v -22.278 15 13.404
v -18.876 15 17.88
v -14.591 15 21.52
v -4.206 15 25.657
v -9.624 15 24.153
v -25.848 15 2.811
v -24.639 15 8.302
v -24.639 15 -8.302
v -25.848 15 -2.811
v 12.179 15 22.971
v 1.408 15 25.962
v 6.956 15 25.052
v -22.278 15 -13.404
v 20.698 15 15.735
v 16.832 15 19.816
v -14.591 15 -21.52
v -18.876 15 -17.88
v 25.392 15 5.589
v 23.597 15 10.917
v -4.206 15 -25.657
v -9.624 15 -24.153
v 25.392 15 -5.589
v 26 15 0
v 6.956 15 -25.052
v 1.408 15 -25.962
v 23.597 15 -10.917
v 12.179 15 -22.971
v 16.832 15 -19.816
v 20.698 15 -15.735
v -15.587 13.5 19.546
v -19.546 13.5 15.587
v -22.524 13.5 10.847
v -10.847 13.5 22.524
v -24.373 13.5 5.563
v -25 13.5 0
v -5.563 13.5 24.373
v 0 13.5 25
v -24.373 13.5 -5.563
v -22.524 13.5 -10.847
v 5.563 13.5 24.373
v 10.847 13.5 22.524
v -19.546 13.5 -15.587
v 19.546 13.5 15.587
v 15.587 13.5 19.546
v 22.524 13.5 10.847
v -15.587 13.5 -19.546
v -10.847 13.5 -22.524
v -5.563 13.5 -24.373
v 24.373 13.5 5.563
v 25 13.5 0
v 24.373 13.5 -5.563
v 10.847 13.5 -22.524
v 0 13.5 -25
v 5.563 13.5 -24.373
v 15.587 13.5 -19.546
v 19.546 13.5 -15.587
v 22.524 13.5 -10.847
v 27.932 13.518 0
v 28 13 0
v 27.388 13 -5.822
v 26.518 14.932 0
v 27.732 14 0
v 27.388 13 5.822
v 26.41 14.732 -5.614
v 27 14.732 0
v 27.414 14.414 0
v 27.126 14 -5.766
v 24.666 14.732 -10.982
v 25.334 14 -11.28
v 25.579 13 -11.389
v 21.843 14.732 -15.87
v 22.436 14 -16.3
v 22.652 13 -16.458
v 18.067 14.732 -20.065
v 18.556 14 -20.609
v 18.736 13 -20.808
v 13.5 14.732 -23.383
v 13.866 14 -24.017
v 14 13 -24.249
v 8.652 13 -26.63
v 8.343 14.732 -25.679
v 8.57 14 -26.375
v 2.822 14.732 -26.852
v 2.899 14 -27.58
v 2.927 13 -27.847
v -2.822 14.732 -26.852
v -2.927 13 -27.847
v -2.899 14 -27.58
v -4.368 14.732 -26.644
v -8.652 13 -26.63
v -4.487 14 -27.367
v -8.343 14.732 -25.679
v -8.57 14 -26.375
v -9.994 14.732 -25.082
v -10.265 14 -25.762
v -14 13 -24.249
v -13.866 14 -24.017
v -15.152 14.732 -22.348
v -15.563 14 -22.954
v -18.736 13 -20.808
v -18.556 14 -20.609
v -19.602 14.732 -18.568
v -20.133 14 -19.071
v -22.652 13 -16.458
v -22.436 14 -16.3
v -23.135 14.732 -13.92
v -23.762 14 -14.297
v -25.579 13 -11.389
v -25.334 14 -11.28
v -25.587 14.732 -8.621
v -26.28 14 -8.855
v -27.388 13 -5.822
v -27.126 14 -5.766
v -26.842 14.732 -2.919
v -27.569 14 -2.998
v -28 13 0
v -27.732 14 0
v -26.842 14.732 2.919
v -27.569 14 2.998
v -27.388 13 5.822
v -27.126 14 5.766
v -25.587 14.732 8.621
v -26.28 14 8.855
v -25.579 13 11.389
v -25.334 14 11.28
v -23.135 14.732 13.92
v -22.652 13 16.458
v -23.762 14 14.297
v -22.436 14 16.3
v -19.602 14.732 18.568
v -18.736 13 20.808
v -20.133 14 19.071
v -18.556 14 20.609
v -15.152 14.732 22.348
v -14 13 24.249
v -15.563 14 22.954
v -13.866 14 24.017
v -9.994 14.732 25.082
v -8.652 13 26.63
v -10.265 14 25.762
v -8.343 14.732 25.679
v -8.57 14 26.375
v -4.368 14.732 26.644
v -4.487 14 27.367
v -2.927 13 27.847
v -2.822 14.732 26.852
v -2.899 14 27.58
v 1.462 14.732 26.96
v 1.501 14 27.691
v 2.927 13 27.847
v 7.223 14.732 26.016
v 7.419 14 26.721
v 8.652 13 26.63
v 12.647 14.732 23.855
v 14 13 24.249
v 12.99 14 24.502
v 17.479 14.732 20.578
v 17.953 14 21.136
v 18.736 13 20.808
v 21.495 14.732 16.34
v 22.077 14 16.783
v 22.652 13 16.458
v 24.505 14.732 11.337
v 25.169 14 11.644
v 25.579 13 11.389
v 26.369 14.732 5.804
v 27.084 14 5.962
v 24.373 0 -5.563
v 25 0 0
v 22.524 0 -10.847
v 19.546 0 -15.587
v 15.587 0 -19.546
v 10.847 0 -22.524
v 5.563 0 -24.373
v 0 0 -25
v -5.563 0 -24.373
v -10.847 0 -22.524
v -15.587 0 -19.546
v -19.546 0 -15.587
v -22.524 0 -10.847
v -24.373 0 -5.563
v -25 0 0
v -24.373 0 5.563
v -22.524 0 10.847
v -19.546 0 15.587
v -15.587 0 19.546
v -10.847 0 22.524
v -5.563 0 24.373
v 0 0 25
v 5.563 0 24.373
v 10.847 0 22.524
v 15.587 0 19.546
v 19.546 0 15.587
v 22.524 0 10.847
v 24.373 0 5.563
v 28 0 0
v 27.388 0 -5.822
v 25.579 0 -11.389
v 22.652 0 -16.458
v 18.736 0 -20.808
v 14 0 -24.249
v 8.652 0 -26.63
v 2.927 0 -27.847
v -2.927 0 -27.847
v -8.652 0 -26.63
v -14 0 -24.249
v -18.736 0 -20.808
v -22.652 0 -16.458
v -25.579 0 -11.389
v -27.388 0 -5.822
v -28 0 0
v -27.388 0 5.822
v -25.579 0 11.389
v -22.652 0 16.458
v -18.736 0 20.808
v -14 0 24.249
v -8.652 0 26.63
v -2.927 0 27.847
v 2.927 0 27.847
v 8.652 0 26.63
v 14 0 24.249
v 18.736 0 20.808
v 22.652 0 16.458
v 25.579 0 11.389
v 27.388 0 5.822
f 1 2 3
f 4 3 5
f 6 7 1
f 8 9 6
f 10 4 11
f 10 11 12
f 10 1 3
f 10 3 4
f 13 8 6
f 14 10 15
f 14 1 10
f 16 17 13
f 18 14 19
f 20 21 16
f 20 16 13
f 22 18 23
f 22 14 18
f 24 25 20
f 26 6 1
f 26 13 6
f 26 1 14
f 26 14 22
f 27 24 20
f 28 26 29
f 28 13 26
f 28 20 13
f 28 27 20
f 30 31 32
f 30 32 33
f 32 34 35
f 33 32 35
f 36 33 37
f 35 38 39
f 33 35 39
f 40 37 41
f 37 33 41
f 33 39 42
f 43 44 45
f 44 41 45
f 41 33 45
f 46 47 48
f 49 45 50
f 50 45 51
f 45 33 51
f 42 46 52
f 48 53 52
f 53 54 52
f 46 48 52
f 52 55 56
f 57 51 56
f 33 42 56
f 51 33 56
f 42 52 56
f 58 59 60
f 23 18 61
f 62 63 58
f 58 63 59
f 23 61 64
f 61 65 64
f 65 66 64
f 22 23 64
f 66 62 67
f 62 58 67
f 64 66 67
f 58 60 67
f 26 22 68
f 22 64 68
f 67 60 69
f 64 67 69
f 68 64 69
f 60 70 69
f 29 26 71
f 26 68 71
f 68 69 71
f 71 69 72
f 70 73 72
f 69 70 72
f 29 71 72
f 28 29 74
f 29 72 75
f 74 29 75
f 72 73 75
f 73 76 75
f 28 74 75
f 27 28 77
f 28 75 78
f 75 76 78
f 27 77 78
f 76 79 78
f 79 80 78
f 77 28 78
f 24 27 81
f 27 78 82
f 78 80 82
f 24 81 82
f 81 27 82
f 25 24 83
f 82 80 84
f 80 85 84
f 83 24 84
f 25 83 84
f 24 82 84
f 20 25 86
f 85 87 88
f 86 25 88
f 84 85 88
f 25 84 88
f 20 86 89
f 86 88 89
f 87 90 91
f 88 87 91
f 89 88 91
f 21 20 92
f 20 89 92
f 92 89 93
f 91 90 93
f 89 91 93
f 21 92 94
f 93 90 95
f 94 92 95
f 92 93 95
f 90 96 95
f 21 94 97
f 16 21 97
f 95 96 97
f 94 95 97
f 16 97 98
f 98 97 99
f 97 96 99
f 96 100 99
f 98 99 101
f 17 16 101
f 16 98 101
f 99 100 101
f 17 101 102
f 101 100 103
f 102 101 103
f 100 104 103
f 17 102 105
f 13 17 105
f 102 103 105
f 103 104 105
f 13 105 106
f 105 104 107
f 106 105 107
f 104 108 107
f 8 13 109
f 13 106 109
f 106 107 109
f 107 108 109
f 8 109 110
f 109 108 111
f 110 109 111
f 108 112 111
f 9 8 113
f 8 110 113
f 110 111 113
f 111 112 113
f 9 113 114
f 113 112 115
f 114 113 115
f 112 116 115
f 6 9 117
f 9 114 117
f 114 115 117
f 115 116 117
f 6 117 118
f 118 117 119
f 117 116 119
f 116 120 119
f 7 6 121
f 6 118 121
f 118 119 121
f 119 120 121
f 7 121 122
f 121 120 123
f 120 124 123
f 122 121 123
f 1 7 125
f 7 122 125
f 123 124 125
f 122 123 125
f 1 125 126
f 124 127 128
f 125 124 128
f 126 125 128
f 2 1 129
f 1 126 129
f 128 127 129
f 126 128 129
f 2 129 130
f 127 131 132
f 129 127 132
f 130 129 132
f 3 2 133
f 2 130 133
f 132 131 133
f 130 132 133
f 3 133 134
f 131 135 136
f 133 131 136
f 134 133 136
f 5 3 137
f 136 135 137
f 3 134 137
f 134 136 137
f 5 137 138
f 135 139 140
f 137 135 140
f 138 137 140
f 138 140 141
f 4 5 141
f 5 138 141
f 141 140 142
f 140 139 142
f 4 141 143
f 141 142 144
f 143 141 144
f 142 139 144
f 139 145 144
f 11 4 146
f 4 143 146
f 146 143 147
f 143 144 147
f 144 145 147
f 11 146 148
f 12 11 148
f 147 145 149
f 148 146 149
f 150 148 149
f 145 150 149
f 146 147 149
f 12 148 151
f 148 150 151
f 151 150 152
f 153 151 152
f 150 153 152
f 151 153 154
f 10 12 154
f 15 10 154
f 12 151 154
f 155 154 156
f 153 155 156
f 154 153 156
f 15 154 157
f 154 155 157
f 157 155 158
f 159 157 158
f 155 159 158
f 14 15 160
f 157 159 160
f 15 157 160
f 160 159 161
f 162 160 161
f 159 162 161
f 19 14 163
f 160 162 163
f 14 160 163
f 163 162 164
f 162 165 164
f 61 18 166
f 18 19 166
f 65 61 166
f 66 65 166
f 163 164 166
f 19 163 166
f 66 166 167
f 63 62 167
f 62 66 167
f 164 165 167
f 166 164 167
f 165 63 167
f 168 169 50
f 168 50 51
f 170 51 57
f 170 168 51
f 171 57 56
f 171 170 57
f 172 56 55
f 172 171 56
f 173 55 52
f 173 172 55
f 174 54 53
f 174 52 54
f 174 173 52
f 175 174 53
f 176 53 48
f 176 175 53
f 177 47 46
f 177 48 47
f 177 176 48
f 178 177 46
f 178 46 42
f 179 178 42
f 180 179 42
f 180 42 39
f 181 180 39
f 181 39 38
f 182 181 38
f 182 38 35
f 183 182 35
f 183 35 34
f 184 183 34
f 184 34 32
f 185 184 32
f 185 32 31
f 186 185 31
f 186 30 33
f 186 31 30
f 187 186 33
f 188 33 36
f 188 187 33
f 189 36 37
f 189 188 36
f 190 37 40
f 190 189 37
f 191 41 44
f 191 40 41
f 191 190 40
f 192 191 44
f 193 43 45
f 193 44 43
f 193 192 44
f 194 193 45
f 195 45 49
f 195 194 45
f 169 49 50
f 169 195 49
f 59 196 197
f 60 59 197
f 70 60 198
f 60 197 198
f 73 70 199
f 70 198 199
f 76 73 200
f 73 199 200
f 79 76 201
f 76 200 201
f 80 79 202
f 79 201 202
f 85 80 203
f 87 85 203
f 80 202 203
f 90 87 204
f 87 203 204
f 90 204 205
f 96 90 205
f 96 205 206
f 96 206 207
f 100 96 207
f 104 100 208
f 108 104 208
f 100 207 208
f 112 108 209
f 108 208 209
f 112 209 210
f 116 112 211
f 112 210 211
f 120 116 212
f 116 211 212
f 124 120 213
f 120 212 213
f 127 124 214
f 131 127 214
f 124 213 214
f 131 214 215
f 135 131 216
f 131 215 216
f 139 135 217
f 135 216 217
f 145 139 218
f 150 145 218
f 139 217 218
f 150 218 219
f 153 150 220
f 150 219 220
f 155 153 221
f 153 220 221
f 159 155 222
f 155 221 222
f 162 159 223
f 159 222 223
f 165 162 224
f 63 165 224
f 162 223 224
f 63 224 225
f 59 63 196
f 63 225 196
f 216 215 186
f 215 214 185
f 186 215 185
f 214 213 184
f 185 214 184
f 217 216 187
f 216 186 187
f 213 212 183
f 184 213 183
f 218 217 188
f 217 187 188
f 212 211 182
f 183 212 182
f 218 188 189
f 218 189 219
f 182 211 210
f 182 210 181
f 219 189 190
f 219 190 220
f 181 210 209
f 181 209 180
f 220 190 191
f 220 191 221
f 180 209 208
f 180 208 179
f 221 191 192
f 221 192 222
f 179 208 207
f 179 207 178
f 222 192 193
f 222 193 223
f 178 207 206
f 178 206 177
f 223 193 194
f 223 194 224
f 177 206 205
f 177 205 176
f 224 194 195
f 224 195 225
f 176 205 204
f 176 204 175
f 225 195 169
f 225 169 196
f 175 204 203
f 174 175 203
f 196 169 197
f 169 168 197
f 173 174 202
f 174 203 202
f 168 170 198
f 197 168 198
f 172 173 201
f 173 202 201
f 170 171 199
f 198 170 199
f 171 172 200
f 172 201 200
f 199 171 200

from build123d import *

# Parameters (mm, degrees)
SKETCH1_R           = 28
SKETCH1_R_2         = 25
BOSS_EXTRUDE1_DEPTH = 15
SKETCH2_R           = 25.289752038
BOSS_EXTRUDE2_DEPTH = 1.5
FILLET1_R           = 2


with BuildPart() as part:
    # Sketch1 → Boss-Extrude1 (new body)
    with BuildSketch(Plane(origin=(0, 0, 0), x_dir=(1, 0, 0), z_dir=(0, 1, 0))):
        Circle(SKETCH1_R)
        Circle(SKETCH1_R_2, mode=Mode.SUBTRACT)
    extrude(amount=BOSS_EXTRUDE1_DEPTH)

    # Sketch2 → Boss-Extrude2 (add)
    with BuildSketch(Plane(origin=(0, 15, 0), x_dir=(1, 0, 0), z_dir=(0, 1, 0))):
        Circle(SKETCH2_R)
    extrude(amount=-BOSS_EXTRUDE2_DEPTH)

    # Fillet1
    fillet1_edges = [part.edges().sort_by_distance(p)[0] for p in [
        (-28, 15, 0),
    ]]
    fillet(fillet1_edges, radius=FILLET1_R)


solid = part.part
